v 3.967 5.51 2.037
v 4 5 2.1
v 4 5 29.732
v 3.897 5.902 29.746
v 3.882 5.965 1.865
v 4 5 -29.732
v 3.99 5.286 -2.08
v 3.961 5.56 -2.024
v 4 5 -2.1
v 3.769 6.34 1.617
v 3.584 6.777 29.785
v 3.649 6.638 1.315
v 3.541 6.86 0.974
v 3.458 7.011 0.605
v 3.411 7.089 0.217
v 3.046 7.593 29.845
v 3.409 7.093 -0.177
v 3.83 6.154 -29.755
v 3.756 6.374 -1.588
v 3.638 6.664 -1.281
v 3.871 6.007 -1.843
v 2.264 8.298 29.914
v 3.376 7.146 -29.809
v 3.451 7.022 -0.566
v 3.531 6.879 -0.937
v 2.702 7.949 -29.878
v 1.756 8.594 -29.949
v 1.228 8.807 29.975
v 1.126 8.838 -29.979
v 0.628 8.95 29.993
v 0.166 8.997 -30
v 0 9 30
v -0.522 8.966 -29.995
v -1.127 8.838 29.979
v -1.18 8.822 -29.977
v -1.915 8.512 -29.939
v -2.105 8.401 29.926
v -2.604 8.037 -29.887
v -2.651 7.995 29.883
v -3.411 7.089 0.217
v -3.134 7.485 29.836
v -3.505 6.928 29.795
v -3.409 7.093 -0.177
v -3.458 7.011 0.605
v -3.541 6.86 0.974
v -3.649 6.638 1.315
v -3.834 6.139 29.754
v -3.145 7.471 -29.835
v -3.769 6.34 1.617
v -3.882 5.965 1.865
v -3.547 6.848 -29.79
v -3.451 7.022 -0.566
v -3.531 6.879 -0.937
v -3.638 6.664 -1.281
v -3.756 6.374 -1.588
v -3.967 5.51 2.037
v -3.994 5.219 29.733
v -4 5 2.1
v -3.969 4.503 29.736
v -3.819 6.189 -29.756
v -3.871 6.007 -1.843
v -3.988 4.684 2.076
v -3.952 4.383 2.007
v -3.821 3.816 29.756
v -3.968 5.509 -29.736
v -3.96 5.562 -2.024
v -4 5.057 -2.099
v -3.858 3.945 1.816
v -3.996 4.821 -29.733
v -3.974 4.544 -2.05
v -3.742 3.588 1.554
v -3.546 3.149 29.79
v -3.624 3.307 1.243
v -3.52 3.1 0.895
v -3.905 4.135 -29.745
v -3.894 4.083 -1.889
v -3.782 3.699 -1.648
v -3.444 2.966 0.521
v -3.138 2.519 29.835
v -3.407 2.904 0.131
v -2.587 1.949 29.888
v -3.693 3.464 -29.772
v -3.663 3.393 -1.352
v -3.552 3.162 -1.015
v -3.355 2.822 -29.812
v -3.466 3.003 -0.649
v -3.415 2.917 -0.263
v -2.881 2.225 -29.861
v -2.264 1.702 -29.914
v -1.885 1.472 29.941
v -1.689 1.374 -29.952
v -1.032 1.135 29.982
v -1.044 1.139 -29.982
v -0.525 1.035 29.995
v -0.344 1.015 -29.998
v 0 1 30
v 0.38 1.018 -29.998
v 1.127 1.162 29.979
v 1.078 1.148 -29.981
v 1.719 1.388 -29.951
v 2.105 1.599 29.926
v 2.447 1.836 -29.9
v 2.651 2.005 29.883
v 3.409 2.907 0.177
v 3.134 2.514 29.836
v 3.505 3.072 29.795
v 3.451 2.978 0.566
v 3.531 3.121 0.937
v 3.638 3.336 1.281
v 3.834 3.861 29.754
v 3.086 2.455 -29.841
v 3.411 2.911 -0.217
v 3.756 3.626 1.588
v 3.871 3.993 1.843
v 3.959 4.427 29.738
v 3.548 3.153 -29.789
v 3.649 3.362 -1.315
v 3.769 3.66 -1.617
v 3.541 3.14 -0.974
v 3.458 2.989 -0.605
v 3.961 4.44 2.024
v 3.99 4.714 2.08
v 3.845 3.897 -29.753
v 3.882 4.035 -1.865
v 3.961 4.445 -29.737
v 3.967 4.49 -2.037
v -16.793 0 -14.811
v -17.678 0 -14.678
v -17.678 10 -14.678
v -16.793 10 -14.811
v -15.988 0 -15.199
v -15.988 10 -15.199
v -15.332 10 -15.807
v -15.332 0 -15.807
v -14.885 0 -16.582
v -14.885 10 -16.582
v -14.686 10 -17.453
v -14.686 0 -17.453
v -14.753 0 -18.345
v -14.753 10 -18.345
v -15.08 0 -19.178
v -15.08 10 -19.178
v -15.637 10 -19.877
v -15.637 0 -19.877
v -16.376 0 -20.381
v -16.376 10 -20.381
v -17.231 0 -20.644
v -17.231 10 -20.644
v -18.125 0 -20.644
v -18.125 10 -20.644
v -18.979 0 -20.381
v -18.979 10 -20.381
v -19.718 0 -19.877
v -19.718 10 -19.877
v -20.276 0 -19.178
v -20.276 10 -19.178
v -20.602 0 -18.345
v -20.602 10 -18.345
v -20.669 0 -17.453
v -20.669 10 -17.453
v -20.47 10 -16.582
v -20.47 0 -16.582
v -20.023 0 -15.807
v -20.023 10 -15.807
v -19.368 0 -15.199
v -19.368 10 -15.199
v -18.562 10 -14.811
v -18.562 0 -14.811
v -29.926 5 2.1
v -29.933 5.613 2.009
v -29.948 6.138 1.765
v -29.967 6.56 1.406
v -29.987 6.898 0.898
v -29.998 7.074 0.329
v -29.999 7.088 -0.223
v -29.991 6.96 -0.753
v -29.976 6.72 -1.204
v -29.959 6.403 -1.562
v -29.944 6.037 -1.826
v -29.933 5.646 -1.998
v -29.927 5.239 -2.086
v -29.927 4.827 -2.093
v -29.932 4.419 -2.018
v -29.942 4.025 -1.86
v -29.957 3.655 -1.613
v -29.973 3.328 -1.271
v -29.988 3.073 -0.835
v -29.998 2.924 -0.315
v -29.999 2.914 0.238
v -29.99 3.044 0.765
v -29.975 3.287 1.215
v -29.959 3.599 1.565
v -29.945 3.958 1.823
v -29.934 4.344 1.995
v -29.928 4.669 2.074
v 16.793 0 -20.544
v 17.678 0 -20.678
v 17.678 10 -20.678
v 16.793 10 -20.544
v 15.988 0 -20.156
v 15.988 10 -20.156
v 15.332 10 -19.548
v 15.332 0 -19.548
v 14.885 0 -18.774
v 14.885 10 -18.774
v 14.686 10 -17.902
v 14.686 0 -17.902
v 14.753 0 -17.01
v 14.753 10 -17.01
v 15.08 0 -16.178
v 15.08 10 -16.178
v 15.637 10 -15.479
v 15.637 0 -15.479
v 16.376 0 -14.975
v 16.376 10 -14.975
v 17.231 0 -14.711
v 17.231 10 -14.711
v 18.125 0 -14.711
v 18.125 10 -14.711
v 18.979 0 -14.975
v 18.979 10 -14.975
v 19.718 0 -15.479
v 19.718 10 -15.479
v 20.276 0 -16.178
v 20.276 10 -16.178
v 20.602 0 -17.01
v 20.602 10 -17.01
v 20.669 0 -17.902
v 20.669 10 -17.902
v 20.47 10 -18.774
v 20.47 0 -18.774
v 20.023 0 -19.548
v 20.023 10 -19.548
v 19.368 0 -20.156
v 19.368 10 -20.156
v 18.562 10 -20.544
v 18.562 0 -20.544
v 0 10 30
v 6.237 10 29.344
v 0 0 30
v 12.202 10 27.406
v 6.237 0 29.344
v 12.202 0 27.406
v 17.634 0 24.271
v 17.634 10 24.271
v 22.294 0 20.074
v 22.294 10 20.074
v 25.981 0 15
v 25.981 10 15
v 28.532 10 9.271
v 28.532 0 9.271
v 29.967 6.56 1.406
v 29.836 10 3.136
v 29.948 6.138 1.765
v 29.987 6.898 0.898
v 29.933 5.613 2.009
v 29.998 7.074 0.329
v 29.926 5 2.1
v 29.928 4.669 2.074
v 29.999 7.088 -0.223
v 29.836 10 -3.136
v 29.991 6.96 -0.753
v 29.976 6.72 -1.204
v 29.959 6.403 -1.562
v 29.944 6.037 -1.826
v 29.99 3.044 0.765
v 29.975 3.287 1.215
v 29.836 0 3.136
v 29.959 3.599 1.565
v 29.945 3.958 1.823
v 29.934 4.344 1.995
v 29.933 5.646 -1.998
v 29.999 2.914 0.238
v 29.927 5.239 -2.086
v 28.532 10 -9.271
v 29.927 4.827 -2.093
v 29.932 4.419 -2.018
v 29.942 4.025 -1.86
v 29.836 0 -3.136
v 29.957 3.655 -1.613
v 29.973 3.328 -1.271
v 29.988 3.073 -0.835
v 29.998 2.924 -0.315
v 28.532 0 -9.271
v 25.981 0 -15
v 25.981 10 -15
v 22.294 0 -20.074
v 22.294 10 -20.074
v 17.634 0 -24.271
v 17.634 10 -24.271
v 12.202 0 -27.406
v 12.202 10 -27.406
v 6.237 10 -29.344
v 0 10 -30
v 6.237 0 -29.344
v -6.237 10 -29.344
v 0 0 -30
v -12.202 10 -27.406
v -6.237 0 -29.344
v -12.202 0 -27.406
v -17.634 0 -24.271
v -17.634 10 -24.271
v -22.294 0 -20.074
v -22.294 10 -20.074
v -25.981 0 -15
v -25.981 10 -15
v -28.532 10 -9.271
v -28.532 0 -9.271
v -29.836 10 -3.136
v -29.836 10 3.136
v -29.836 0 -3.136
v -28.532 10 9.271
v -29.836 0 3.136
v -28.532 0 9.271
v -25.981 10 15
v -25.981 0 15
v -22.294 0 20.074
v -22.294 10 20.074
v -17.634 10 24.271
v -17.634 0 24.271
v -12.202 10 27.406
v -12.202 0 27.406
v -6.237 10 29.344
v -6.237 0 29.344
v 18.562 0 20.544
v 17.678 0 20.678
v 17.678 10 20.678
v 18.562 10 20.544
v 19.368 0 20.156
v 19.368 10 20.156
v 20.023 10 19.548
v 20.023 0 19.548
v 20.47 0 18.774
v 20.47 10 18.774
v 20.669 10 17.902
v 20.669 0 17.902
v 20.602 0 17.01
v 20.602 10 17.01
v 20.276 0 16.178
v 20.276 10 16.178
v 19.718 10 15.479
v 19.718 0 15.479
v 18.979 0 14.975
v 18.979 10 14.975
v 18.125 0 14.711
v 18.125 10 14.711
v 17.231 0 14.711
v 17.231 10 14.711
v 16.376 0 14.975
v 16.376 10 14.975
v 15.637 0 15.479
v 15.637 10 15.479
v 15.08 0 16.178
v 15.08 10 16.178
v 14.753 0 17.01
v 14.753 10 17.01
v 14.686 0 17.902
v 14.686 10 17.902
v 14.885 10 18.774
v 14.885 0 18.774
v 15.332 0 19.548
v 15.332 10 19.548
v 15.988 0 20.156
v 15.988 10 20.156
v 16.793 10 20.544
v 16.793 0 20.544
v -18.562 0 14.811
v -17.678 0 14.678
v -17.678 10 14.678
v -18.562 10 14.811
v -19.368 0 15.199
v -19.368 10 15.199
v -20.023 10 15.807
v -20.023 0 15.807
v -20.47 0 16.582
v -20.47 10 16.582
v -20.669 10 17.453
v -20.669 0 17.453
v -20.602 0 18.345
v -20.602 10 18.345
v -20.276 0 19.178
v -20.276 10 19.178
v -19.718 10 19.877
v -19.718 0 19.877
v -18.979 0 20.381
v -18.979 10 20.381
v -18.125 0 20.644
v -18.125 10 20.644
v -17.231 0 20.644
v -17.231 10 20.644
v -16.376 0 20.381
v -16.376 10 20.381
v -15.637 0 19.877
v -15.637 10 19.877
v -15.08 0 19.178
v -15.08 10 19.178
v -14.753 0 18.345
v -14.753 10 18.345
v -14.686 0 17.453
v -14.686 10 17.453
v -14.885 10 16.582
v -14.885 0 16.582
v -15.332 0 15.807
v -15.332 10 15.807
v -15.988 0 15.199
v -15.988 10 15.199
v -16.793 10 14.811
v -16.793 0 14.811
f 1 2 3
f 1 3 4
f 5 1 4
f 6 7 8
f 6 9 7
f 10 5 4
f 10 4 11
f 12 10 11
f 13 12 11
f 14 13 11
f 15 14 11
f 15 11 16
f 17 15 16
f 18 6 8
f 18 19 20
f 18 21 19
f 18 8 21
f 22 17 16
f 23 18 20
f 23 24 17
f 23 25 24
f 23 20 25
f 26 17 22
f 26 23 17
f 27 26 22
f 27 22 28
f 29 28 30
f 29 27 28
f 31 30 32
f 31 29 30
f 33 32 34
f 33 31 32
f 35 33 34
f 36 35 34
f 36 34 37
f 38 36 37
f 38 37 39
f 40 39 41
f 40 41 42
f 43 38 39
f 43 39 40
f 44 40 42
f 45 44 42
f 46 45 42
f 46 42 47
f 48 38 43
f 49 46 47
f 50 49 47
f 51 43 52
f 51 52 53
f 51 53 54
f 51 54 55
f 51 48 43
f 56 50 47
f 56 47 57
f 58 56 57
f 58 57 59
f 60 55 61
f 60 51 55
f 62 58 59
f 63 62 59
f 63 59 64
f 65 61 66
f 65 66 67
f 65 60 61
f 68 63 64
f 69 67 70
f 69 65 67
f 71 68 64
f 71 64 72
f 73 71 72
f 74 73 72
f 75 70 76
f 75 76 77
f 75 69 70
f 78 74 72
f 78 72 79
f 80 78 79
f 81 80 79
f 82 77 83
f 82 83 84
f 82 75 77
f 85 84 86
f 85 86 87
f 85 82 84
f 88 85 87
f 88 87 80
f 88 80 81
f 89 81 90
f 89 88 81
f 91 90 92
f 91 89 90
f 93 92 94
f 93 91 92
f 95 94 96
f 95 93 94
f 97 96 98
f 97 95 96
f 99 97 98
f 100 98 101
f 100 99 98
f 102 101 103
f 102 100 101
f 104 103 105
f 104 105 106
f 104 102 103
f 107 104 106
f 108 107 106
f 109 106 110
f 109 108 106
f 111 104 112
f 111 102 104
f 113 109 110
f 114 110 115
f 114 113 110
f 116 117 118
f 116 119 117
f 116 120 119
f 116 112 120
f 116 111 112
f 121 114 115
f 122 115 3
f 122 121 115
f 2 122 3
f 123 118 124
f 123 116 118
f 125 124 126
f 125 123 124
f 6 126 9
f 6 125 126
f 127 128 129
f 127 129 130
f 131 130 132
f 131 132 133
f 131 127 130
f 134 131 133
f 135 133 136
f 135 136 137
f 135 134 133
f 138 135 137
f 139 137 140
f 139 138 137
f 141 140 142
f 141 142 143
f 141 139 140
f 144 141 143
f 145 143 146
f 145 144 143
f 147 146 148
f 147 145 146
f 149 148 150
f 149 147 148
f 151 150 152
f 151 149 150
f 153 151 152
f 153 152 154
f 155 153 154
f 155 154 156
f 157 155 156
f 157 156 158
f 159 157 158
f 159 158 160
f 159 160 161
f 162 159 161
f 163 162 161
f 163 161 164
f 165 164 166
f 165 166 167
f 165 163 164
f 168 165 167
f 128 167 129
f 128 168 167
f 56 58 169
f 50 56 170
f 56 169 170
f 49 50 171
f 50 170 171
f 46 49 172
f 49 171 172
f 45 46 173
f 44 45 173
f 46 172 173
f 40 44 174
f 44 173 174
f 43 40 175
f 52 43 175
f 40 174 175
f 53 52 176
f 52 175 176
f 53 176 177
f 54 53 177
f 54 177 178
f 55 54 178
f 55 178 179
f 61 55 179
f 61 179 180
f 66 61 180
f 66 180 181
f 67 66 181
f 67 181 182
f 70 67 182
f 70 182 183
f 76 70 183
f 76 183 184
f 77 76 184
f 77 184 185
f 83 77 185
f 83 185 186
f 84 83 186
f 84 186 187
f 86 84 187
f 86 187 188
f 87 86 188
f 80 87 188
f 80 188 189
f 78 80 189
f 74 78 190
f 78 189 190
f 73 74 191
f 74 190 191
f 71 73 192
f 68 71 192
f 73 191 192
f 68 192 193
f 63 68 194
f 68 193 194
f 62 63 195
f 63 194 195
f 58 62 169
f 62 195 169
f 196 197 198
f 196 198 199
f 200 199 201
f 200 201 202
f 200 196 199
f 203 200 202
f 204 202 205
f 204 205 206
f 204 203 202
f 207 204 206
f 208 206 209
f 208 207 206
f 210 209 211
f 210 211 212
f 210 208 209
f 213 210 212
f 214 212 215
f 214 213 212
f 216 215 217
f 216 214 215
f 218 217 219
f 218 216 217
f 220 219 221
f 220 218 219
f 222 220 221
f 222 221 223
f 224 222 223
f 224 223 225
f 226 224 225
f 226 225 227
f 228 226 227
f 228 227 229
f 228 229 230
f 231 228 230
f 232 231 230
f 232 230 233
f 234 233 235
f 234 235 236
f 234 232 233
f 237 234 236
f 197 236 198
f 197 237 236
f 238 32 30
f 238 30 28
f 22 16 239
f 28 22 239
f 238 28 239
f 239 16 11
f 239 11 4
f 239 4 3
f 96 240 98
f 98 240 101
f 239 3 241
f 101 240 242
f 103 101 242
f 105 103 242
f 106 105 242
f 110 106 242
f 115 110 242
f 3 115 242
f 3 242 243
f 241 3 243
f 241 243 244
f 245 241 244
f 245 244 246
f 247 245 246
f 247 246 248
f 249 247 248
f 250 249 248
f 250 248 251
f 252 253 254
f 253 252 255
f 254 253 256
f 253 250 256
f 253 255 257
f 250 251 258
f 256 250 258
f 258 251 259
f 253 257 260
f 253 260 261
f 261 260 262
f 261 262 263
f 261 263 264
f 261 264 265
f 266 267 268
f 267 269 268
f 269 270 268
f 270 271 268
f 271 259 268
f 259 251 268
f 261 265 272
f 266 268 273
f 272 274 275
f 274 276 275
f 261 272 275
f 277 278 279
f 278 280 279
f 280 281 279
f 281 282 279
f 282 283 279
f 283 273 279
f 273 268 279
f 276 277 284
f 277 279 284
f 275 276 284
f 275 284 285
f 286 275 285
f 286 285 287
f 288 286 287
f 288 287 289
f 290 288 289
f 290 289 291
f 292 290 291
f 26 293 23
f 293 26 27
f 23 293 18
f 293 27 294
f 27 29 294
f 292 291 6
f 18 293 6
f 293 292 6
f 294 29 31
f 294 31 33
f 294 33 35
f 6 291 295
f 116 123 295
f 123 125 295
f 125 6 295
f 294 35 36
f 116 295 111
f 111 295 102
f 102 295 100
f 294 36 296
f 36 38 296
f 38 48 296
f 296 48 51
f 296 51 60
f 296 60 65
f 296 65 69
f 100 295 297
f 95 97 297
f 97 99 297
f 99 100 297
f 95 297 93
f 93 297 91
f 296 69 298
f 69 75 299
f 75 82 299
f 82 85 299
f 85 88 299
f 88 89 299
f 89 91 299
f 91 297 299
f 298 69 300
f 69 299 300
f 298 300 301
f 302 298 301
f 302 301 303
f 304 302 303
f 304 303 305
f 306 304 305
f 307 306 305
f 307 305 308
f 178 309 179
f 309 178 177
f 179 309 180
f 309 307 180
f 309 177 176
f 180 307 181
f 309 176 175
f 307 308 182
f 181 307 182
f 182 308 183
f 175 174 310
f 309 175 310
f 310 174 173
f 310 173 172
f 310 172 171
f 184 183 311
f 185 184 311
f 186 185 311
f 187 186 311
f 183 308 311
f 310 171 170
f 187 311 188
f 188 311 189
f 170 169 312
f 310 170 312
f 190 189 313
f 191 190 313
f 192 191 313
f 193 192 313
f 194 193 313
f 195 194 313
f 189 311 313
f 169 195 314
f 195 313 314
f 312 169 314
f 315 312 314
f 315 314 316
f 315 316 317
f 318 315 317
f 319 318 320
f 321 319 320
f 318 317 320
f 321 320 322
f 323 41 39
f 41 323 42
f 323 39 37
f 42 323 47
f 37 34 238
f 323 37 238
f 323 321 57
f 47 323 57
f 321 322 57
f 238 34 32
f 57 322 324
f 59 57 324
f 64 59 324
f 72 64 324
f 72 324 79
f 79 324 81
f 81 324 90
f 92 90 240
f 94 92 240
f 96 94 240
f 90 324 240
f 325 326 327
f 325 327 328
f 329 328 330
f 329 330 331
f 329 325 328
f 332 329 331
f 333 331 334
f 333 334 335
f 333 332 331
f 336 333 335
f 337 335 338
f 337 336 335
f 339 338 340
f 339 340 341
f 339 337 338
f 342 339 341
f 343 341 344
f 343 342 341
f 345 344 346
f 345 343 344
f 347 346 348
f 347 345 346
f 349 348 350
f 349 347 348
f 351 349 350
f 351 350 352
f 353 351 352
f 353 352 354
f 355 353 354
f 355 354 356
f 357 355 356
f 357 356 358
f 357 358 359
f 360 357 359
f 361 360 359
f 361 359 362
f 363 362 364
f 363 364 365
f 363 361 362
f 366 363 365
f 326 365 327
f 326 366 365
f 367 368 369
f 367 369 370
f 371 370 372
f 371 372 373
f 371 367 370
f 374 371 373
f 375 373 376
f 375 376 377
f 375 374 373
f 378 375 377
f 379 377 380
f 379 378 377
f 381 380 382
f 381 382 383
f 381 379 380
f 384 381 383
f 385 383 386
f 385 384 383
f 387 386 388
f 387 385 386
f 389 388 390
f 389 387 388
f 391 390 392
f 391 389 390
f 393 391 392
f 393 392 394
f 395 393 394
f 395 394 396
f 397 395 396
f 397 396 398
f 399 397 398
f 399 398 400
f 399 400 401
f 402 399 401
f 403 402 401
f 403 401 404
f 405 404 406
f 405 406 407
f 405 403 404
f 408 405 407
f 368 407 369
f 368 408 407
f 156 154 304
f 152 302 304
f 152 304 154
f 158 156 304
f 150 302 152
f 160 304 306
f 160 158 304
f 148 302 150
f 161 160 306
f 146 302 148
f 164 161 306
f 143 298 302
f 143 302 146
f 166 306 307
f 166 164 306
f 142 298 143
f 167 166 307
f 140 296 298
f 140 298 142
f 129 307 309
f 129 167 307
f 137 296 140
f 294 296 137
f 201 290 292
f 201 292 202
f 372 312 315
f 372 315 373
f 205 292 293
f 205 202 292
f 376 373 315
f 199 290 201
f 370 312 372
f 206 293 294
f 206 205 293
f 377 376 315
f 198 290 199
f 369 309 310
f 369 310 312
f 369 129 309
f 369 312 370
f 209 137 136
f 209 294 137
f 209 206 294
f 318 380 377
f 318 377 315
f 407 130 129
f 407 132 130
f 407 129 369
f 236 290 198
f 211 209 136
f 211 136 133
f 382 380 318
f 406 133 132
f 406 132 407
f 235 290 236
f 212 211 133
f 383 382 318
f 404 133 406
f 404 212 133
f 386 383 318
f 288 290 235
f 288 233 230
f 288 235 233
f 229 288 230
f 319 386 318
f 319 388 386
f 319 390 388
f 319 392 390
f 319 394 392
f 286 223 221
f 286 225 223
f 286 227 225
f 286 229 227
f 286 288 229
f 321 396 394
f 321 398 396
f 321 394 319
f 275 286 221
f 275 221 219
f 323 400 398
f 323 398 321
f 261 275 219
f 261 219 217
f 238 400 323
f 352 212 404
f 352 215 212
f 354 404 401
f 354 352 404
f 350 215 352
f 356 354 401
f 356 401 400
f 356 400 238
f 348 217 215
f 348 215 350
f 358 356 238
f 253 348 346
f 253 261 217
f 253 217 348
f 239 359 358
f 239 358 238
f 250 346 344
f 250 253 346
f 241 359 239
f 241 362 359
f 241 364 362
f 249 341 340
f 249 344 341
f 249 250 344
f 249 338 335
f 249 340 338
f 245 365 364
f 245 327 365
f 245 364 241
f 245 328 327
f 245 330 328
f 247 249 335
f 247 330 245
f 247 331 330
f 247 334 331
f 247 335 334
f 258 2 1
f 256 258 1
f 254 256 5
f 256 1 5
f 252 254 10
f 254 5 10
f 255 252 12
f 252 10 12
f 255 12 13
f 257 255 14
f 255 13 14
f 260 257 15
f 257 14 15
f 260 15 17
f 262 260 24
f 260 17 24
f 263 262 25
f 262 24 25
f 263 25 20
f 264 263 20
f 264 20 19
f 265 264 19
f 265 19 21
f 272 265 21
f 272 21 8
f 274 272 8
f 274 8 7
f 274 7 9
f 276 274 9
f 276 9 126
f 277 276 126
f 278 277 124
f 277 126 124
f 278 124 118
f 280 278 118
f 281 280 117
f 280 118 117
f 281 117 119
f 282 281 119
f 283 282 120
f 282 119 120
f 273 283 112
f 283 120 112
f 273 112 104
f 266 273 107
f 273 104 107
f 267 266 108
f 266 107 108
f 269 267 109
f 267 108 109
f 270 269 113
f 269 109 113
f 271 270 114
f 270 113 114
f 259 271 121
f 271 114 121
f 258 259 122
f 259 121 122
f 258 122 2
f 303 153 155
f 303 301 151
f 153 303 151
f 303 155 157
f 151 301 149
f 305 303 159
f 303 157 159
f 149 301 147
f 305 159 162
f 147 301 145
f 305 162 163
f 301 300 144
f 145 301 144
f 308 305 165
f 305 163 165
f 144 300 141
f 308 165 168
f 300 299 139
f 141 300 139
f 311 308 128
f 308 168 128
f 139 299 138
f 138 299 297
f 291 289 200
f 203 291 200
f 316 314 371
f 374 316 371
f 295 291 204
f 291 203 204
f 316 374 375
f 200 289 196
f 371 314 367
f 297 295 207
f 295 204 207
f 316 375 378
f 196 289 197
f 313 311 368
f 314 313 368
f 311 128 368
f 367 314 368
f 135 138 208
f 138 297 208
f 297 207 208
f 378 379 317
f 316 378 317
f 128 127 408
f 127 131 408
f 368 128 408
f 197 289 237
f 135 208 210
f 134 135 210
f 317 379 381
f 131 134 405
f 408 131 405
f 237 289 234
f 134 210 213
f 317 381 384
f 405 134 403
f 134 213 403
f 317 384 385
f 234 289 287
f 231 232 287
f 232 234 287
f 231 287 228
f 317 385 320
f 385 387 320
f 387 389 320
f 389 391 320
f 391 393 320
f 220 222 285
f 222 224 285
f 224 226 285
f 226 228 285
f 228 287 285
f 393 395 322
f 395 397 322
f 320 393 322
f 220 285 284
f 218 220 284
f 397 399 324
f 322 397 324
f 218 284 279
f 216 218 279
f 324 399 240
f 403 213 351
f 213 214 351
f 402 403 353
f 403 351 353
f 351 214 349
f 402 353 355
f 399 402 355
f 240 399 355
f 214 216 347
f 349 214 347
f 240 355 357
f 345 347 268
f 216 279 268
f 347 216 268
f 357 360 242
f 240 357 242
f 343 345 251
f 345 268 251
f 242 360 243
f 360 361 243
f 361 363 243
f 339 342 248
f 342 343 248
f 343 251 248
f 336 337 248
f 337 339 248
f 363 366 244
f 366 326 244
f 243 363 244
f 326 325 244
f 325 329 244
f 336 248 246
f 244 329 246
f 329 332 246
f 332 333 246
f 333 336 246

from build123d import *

# Parameters (mm, degrees)
SKETCH_1_R               = 30
SKETCH_1_R_2             = 3
EXTRUDE_1_DEPTH          = 10
CUT_EXTRUDE_1_DEPTH      = 44.588989435
CUT_EXTRUDE_1_DEPTH_BACK = 44.588989435
SKETCH_2_R               = 4
SKETCH_3_R               = 2
EXTRUDE_2_DEPTH          = 32.5
HOLE_WIZARD_M5_2_D       = 4.2


with BuildPart() as part:
    # 草图1 → 凸台-拉伸1 (new body)
    with BuildSketch(Plane(origin=(0, 0, 0), x_dir=(1, 0, 0), z_dir=(0, 1, 0))):
        with Locations(Location((0, 0, 0), (0, 0, 270))):
            Circle(SKETCH_1_R)
        with Locations(Location((-17.67766953, 17.67766953, 0), (0, 0, 270))):
            Circle(SKETCH_1_R_2, mode=Mode.SUBTRACT)
        with Locations(Location((17.67766953, 17.67766953, 0), (0, 0, 90))):
            Circle(SKETCH_1_R_2, mode=Mode.SUBTRACT)
        with Locations(Location((17.67766953, -17.67766953, 0), (0, 0, 270))):
            Circle(SKETCH_1_R_2, mode=Mode.SUBTRACT)
        with Locations(Location((-17.67766953, -17.67766953, 0), (0, 0, 90))):
            Circle(SKETCH_1_R_2, mode=Mode.SUBTRACT)
    extrude(amount=EXTRUDE_1_DEPTH)

    # 草图2 → 切除-拉伸1 (cut, two sides: drawn at the far end of the back side and taken through both)
    with BuildSketch(Plane.XY.offset(-CUT_EXTRUDE_1_DEPTH_BACK)):
        with Locations((0, 5)):
            Circle(SKETCH_2_R)
    extrude(amount=CUT_EXTRUDE_1_DEPTH + CUT_EXTRUDE_1_DEPTH_BACK, mode=Mode.SUBTRACT)

    # 草图3 → 凸台-拉伸2 (add, symmetric)
    with BuildSketch(Plane(origin=(0, 0, 0), x_dir=(0, 0, -1), z_dir=(1, 0, 0))):
        with Locations(Location((0, 5, 0), (0, 0, 180))):
            Circle(SKETCH_3_R)
    extrude(amount=EXTRUDE_2_DEPTH, both=True)

    # M5 螺纹孔2 (through all)
    with Locations(Plane(origin=(32.5, 0, 0), x_dir=(0, 0, -1), z_dir=(1, 0, 0))):
        with Locations((0, 5)):
            Hole(HOLE_WIZARD_M5_2_D / 2)


solid = part.part
